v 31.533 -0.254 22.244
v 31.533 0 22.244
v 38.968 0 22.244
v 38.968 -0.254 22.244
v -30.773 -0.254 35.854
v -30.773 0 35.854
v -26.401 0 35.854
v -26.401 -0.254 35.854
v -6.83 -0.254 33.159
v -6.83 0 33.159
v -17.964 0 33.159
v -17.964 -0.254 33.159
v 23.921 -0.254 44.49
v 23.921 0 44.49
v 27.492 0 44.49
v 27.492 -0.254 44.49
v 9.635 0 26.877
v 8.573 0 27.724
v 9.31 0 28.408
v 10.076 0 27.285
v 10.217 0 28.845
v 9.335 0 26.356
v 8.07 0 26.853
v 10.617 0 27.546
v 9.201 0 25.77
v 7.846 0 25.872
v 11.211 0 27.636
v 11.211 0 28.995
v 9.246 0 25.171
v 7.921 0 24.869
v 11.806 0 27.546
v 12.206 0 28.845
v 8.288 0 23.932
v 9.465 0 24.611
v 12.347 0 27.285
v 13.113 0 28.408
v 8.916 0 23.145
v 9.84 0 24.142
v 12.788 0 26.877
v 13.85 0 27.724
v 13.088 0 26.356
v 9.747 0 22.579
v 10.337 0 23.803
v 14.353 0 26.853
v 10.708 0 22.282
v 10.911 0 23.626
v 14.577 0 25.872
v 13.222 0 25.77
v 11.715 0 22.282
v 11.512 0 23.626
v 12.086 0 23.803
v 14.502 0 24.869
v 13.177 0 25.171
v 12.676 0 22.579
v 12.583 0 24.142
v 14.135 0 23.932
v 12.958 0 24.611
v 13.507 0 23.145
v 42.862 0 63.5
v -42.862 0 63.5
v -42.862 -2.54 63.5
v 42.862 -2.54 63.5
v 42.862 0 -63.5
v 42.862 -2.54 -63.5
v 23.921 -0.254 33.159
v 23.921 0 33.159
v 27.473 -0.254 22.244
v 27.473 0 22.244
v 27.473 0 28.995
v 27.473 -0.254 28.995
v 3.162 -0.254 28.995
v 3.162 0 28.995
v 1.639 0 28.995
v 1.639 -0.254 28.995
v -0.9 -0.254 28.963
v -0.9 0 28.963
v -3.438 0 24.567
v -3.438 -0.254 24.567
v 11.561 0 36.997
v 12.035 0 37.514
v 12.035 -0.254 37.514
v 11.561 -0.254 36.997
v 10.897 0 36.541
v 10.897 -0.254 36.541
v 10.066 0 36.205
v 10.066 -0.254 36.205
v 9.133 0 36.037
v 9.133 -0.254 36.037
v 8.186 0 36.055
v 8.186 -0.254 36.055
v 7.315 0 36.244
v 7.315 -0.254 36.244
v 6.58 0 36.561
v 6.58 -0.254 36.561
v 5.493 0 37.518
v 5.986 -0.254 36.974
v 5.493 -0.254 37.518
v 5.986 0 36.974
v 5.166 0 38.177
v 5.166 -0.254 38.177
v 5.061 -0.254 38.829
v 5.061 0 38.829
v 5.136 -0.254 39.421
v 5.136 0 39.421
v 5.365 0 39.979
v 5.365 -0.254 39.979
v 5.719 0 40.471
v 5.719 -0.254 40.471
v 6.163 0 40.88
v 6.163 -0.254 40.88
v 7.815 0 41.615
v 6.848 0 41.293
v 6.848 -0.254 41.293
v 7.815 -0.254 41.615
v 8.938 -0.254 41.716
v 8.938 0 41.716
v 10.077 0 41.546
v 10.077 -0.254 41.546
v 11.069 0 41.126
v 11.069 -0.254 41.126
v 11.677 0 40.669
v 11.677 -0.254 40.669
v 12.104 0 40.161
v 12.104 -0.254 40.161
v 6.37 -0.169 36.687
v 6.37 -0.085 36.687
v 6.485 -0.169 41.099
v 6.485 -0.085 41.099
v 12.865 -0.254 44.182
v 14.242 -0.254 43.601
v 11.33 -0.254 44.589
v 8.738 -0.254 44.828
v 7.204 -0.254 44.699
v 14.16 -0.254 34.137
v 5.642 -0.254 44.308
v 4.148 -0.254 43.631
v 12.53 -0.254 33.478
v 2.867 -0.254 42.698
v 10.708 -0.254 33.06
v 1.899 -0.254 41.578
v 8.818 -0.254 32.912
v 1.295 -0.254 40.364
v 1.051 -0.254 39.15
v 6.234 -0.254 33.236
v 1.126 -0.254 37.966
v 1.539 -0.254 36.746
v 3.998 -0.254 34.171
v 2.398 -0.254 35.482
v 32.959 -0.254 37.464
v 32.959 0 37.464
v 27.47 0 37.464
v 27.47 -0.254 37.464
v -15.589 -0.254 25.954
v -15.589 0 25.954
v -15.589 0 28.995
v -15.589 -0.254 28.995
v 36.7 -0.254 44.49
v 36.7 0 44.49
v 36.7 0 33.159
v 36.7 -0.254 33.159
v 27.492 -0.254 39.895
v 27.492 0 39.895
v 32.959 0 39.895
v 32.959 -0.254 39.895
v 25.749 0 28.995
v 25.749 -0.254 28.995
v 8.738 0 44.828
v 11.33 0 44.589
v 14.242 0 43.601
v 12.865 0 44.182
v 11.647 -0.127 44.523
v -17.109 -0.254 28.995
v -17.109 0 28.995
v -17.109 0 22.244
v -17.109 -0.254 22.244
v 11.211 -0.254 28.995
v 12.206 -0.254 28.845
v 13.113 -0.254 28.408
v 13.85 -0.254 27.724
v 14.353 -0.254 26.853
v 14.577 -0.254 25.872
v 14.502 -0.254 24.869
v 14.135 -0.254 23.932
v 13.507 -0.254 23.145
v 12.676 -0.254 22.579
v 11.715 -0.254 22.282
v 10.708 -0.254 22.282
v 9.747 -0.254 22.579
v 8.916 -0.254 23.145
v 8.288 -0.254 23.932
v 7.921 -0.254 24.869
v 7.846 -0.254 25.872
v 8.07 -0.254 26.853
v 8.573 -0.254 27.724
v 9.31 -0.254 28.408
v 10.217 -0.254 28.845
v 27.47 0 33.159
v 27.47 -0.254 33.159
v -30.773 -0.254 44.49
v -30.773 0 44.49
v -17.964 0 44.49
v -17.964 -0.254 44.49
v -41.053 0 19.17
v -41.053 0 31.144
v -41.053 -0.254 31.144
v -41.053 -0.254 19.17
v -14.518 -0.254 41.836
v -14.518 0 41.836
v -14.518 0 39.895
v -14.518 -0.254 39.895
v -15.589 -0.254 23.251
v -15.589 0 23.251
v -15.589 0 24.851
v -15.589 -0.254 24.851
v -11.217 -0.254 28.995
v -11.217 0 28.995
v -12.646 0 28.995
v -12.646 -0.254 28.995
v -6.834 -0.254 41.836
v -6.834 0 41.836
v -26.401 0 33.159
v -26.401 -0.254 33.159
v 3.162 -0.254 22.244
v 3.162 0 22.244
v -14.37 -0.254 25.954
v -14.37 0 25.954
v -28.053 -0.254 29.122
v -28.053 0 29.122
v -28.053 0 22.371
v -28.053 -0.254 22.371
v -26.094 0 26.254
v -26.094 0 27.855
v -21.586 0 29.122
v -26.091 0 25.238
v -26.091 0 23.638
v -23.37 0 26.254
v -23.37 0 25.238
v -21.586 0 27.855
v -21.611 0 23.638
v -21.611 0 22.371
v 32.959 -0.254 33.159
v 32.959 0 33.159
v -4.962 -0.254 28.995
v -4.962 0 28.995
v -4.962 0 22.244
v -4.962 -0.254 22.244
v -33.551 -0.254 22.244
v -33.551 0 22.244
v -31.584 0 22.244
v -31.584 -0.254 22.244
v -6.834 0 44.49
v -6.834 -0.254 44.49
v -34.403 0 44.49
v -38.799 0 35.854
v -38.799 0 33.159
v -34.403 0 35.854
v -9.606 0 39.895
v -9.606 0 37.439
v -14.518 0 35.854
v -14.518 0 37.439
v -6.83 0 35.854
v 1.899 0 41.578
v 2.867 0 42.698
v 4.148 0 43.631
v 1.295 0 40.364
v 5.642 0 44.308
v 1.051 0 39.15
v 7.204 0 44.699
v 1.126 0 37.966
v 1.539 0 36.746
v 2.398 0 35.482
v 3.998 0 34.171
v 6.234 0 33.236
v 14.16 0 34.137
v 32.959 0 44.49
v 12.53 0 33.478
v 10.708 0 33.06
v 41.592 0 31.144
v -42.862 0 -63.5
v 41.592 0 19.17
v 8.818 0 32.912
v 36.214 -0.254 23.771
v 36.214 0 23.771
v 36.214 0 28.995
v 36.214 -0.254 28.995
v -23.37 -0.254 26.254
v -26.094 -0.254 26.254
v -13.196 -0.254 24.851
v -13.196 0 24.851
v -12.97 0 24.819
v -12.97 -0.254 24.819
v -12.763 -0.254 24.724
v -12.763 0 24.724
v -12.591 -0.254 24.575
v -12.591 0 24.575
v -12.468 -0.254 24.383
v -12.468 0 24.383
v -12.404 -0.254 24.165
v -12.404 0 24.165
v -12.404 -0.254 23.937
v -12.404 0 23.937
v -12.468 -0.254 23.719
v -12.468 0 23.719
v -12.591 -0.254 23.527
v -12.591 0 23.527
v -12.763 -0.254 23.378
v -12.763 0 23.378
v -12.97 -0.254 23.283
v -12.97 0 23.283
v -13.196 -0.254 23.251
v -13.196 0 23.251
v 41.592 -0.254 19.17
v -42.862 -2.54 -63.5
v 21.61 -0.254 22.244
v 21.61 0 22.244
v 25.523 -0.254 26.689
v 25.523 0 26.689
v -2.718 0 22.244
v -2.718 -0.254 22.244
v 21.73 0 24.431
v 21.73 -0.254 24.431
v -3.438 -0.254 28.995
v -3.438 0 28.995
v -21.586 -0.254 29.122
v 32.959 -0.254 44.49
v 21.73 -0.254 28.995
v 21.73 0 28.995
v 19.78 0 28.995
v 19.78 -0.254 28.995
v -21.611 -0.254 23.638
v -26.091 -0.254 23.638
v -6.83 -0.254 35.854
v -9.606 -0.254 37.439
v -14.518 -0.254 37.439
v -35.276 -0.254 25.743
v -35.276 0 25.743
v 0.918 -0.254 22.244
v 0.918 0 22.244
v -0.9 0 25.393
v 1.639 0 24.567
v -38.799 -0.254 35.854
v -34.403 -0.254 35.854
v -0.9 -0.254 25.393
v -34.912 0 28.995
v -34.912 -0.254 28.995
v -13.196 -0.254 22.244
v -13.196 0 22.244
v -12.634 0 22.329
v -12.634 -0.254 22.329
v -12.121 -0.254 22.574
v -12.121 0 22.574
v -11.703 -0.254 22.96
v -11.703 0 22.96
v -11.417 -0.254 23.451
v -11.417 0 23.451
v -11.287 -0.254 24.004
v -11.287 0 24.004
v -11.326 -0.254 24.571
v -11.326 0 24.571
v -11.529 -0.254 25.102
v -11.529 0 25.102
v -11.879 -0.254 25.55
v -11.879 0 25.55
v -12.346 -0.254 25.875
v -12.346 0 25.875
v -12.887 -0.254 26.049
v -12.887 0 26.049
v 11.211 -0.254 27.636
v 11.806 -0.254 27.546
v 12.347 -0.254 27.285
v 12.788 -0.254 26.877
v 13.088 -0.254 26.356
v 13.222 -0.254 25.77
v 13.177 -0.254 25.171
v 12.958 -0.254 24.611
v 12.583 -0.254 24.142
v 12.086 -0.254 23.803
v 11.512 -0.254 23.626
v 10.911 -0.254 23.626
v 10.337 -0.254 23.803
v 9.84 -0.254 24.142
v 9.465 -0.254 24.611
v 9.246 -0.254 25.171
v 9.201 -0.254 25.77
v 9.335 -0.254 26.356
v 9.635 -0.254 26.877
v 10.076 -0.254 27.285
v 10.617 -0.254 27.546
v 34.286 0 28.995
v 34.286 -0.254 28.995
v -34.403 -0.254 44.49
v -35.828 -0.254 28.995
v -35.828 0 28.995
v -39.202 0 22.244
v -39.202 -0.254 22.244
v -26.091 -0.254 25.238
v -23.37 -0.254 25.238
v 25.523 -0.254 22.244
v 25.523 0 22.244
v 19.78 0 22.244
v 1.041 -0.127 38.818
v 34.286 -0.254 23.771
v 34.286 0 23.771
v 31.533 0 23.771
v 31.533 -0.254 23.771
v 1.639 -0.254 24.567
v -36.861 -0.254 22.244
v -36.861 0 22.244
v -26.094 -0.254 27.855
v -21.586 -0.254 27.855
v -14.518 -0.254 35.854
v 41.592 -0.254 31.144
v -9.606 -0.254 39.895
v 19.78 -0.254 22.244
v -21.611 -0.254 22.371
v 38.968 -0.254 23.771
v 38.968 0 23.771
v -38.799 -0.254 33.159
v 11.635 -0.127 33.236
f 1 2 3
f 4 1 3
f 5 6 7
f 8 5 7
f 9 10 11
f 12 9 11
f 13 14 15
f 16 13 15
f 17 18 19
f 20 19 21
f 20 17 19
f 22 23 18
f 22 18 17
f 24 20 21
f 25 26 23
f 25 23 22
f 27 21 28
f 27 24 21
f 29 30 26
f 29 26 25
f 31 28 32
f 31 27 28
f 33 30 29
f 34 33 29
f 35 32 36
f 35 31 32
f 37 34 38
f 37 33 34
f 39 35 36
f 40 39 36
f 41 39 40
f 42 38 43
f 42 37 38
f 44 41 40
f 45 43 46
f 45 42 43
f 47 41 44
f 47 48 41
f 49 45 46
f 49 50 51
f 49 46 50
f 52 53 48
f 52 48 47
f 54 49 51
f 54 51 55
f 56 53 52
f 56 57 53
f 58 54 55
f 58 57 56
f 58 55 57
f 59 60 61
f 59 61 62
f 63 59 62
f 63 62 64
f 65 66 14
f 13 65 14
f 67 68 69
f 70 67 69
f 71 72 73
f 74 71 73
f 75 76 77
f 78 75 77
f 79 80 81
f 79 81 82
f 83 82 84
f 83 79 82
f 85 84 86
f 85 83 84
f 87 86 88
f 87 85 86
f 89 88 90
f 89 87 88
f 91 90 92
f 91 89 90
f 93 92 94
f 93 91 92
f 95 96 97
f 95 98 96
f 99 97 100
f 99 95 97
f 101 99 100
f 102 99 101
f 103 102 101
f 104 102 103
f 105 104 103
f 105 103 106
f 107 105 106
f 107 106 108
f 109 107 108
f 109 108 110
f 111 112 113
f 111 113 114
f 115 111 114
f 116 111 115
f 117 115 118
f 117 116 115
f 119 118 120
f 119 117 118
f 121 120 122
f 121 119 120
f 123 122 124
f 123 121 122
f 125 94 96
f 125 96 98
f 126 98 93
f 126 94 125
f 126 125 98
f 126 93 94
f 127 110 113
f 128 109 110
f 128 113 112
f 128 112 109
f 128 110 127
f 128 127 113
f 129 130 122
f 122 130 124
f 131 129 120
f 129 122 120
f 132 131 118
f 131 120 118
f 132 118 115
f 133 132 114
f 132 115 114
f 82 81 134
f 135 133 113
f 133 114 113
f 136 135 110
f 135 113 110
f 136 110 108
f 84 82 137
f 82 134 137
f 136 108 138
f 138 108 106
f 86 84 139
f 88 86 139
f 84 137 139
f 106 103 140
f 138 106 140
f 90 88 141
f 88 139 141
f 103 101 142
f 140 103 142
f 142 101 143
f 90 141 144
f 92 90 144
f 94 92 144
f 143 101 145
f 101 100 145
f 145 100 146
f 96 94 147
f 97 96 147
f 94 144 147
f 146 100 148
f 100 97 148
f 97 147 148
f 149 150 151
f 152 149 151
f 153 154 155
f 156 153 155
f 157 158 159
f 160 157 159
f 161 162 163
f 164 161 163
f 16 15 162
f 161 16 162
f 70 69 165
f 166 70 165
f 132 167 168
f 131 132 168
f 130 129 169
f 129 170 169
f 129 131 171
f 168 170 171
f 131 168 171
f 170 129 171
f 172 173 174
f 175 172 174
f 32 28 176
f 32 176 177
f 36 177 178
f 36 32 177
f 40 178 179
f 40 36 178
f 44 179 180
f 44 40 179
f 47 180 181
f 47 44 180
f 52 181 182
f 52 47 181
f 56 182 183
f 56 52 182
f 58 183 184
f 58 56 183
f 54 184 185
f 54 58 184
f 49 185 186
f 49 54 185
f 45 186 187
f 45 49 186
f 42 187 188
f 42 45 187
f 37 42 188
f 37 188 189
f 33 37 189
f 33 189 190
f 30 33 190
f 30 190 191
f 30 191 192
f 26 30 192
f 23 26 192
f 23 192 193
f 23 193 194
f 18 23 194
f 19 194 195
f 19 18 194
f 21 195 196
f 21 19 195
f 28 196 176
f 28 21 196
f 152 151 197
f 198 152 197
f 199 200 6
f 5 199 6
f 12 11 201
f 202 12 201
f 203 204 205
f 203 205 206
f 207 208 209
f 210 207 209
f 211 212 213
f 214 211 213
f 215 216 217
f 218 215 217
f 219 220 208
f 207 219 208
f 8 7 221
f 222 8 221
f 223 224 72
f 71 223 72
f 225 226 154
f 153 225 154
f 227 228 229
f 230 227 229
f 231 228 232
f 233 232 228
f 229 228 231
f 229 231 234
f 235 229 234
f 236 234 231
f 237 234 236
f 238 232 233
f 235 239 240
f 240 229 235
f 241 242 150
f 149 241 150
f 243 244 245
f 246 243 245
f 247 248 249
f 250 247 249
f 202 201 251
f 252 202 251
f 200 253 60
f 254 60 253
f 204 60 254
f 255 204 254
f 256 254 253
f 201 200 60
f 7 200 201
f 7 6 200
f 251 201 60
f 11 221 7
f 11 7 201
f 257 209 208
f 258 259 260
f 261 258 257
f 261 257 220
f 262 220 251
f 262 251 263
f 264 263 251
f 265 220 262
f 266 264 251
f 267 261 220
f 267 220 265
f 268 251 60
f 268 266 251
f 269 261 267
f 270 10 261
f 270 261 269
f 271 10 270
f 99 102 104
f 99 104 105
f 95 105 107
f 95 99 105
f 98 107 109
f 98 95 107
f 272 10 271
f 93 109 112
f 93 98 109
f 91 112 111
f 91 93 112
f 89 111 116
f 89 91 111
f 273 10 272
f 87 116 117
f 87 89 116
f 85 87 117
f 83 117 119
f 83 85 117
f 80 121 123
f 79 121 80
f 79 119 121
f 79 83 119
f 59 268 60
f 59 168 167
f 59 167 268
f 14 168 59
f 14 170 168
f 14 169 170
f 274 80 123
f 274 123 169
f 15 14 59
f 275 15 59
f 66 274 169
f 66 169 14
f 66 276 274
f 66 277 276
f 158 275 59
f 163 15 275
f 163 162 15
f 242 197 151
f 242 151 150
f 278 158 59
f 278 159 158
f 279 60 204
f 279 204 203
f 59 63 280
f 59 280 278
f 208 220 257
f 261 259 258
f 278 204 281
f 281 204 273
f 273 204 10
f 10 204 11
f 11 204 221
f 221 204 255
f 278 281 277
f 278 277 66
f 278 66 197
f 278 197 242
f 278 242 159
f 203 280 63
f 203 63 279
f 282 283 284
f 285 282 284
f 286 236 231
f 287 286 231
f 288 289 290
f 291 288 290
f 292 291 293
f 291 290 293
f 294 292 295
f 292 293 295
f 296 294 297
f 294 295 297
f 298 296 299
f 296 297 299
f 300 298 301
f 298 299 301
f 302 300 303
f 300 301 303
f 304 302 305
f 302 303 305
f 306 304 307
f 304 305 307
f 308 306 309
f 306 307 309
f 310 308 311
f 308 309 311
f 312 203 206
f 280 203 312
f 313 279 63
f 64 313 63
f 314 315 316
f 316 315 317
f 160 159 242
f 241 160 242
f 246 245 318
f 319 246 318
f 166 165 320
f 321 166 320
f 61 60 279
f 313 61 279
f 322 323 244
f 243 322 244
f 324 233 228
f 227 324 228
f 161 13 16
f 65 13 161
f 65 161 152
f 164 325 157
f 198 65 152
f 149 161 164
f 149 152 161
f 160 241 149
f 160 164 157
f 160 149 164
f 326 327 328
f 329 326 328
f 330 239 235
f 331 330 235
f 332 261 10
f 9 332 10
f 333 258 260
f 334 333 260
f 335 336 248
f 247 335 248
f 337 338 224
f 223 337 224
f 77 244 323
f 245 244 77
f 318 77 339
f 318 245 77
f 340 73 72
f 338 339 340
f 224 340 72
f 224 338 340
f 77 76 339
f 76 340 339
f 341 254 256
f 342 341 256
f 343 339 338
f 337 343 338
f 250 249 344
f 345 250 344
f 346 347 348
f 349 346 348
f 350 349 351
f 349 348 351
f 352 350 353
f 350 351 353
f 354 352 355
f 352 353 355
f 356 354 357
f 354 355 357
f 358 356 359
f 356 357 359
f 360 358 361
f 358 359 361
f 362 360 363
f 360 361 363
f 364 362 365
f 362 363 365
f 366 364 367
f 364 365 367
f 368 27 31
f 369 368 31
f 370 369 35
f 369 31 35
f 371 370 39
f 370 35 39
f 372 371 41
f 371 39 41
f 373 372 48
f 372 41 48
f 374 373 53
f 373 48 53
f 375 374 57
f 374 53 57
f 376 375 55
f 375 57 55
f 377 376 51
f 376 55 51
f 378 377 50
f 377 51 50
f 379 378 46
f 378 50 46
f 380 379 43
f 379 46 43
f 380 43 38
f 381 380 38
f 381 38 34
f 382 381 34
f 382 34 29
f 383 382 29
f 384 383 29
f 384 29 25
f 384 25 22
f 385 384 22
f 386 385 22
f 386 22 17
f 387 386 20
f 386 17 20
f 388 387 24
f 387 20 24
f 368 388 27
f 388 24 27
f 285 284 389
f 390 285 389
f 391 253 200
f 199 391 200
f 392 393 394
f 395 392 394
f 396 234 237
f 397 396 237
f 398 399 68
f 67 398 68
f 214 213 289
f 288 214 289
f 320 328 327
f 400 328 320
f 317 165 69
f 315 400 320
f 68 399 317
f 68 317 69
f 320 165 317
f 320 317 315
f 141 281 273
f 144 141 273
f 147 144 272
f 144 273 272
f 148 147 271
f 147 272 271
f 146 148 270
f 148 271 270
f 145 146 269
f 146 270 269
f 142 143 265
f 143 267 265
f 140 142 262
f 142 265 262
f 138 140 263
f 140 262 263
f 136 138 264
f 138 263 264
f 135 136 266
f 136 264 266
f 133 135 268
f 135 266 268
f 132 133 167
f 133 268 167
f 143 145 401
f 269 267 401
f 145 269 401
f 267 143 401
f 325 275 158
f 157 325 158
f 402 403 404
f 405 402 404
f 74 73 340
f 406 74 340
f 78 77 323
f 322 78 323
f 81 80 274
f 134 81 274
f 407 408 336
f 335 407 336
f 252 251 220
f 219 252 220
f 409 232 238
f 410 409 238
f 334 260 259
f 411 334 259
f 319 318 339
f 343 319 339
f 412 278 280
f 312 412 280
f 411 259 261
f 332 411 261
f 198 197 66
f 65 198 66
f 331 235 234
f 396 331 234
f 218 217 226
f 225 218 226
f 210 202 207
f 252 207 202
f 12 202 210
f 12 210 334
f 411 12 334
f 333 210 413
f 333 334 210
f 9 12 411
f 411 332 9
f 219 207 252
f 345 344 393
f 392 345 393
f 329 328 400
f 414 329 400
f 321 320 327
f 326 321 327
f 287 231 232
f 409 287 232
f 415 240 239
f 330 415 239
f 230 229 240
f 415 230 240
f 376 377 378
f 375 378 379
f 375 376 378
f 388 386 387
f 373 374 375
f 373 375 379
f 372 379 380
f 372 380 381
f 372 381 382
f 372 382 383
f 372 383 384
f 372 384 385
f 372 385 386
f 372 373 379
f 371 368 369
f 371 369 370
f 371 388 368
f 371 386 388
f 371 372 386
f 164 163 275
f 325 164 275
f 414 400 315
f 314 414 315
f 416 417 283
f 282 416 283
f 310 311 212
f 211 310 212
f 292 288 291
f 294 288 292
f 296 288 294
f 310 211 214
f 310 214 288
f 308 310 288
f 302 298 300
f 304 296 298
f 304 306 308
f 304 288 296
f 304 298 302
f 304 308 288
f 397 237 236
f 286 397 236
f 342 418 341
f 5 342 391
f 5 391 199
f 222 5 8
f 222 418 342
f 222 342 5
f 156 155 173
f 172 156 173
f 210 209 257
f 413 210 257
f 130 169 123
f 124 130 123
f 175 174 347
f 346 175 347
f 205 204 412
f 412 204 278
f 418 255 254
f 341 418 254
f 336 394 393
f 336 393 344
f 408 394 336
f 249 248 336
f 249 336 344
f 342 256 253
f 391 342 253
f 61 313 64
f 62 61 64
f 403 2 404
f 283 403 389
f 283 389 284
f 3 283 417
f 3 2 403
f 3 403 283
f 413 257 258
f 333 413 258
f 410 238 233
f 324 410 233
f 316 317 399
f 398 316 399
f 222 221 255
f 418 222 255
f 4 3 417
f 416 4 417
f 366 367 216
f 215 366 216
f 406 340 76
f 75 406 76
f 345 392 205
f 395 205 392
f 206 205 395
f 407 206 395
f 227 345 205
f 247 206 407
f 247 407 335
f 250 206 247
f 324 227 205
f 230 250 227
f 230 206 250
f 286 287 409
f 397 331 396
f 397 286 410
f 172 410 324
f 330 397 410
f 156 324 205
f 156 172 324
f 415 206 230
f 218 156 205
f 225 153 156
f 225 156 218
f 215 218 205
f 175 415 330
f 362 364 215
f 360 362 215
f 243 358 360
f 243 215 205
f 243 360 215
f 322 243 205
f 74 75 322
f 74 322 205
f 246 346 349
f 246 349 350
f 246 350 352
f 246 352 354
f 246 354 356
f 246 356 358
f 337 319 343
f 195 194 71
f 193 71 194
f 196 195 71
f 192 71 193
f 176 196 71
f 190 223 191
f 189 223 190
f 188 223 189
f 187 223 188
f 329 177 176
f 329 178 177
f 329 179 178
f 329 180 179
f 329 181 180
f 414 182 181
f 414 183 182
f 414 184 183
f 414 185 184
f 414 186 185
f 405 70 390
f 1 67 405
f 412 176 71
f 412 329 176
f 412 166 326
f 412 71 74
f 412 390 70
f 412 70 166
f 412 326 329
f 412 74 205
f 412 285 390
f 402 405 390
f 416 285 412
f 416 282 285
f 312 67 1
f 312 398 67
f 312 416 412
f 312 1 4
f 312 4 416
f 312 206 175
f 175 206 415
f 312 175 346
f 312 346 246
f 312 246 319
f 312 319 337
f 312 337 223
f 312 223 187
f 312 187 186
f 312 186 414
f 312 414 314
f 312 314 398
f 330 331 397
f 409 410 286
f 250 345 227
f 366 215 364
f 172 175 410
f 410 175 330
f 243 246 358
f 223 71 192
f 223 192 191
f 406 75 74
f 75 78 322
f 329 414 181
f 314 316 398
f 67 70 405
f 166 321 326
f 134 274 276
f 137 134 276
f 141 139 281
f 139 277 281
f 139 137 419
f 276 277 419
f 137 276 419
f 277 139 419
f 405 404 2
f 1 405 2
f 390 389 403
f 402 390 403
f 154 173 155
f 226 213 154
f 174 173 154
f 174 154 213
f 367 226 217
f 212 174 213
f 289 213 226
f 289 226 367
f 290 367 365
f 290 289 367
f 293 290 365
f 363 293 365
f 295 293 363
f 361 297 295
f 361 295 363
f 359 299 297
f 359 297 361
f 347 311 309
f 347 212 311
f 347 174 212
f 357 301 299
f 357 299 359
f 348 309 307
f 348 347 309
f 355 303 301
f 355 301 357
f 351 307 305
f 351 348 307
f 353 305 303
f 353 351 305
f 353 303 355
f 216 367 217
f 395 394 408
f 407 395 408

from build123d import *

# Parameters (mm, degrees)
SKETCH2_W           = 85.725
SKETCH2_H           = 127
BOSS_EXTRUDE2_DEPTH = 2.54
SKETCH25_W          = 82.644974211
SKETCH25_H          = 11.973738266
SKETCH25_R          = 3.375228747
SKETCH25_R_2        = 2.016253288
CUT_EXTRUDE3_DEPTH  = 0.254


with BuildPart() as part:
    # Sketch2 → Boss-Extrude2 (new body)
    with BuildSketch(Plane(origin=(0, 0, 0), x_dir=(1, 0, 0), z_dir=(0, 1, 0))):
        Rectangle(SKETCH2_W, SKETCH2_H)
    extrude(amount=-BOSS_EXTRUDE2_DEPTH)

    # Sketch25 → Cut-Extrude3 (cut)
    # profile 1 of 7: a face of its own
    with BuildSketch(Plane(origin=(0, 0, 0), x_dir=(1, 0, 0), z_dir=(0, 1, 0))):
        Polygon((-26.401346176, -35.854393253), (-26.401346176, -33.15882687), (-38.799482128, -33.15882687), (-38.799482128, -35.854393253), (-34.402699091, -35.854393253), (-34.402699091, -44.489516695), (-30.772866408, -44.489516695), (-30.772866408, -35.854393253), align=None)
    # profile 2 of 7: a face of its own
    with BuildSketch(Plane(origin=(0, 0, 0), x_dir=(1, 0, 0), z_dir=(0, 1, 0))):
        with Locations((0.269409109, -25.156846289)):
            Rectangle(SKETCH25_W, SKETCH25_H)
        Polygon((-36.860699174, -22.244332024), (-35.276491705, -25.743290865), (-33.551494351, -22.244332024), (-31.583895256, -22.244332024), (-34.91189134, -28.994789518), (-35.827566034, -28.994789518), (-39.202300363, -22.244332024), align=None, mode=Mode.SUBTRACT)
        Polygon((-21.586075079, -29.121583639), (-28.052993946, -29.121583639), (-28.052993946, -22.371126145), (-21.61112205, -22.371126145), (-21.61112205, -23.638154892), (-26.091406212, -23.638154892), (-26.091406212, -25.238354892), (-23.369701588, -25.238354892), (-23.369701588, -26.254354892), (-26.093979632, -26.254354892), (-26.093979632, -27.854554892), (-21.586075079, -27.854554892), align=None, mode=Mode.SUBTRACT)
        with BuildLine():
            Line((-12.886623389, -26.048756675), (-11.21689897, -28.994789518))
            Line((-11.21689897, -28.994789518), (-12.646380862, -28.994789518))
            Line((-12.646380862, -28.994789518), (-14.370072898, -25.953537147))
            Line((-14.370072898, -25.953537147), (-15.588703764, -25.953537147))
            Line((-15.588703764, -25.953537147), (-15.588703764, -28.994789518))
            Line((-15.588703764, -28.994789518), (-17.109275161, -28.994789518))
            Line((-17.109275161, -28.994789518), (-17.109275161, -22.244332024))
            Line((-17.109275161, -22.244332024), (-13.19566722, -22.244332024))
            ThreePointArc((-13.19566722, -22.244332024), (-11.287189095, -24.004065684), (-12.886623389, -26.048756675))
        make_face(mode=Mode.SUBTRACT)
        Polygon((-4.961504317, -22.244332024), (-2.717782968, -22.244332024), (-0.899784822, -25.393197181), (0.918213323, -22.244332024), (3.161934673, -22.244332024), (3.161934673, -28.994789518), (1.638789862, -28.994789518), (1.638789862, -24.566513755), (-0.899784822, -28.963454088), (-3.438359507, -24.566513755), (-3.438359507, -28.994789518), (-4.961504317, -28.994789518), align=None, mode=Mode.SUBTRACT)
        with Locations(Location((11.211495581, -25.619560771, 0), (0, 0, 270))):
            Circle(SKETCH25_R, mode=Mode.SUBTRACT)
        Polygon((19.780384204, -22.244332024), (21.610158793, -22.244332024), (25.523367769, -26.689139429), (25.523367769, -22.244332024), (27.473297536, -22.244332024), (27.473297536, -28.994789518), (25.748580132, -28.994789518), (21.73031397, -24.430653204), (21.73031397, -28.994789518), (19.780384204, -28.994789518), align=None, mode=Mode.SUBTRACT)
        Polygon((34.286281548, -23.770960204), (31.532751091, -23.770960204), (31.532751091, -22.244332024), (38.967725504, -22.244332024), (38.967725504, -23.770960204), (36.214195047, -23.770960204), (36.214195047, -28.994789518), (34.286281548, -28.994789518), align=None, mode=Mode.SUBTRACT)
    # profile 3 of 7: a face of its own
    with BuildSketch(Plane(origin=(0, 0, 0), x_dir=(1, 0, 0), z_dir=(0, 1, 0))):
        Polygon((-14.518148777, -37.438819572), (-14.518148777, -35.854393253), (-6.83027872, -35.854393253), (-6.83027872, -33.15882687), (-17.964276023, -33.15882687), (-17.964276023, -44.489516695), (-6.833681126, -44.489516695), (-6.833681126, -41.83560261), (-14.518148777, -41.83560261), (-14.518148777, -39.894680368), (-9.606427186, -39.894680368), (-9.606427186, -37.438819572), align=None)
    # profile 4 of 7: a face of its own
    with BuildSketch(Plane(origin=(0, 0, 0), x_dir=(1, 0, 0), z_dir=(0, 1, 0))):
        with BuildLine():
            ThreePointArc((-13.19566722, -24.851050278), (-12.39556722, -24.050950278), (-13.19566722, -23.250850278))
            Line((-13.19566722, -23.250850278), (-15.588703764, -23.250850278))
            Line((-15.588703764, -23.250850278), (-15.588703764, -24.851050278))
            Line((-15.588703764, -24.851050278), (-13.19566722, -24.851050278))
        make_face()
    # profile 5 of 7: a face of its own
    with BuildSketch(Plane(origin=(0, 0, 0), x_dir=(1, 0, 0), z_dir=(0, 1, 0))):
        Polygon((23.921491499, -33.15882687), (23.921491499, -44.489516695), (27.49217728, -44.489516695), (27.49217728, -39.894680368), (32.958681558, -39.894680368), (32.958681558, -44.489516695), (36.700300901, -44.489516695), (36.700300901, -33.15882687), (32.958681558, -33.15882687), (32.958681558, -37.463958465), (27.469552399, -37.463958465), (27.469552399, -33.15882687), align=None)
    # profile 6 of 7: a face of its own
    with BuildSketch(Plane(origin=(0, 0, 0), x_dir=(1, 0, 0), z_dir=(0, 1, 0))):
        with BuildLine():
            add(Edge.make_bspline(
                [(12.034728003, -37.513702885), (9.837658355, -34.446600836), (6.369591885, -36.687217957), (2.901525415, -38.927835078), (6.485301367, -41.099026419), (10.069077319, -43.270217761), (12.104171052, -40.161449829)],
                knots=[3.655446415, 3.655446415, 3.655446415, 5.427524106, 5.427524106, 7.199601796, 7.199601796, 8.971679487, 8.971679487, 8.971679487], degree=2, weights=[1, 0.632485182, 1, 0.632485182, 1, 0.632485182, 1]))
            Line((12.034728003, -37.513702885), (14.159680346, -34.137428518))
            add(Edge.make_bspline(
                [(14.159680346, -34.137428518), (11.789724765, -32.931705874), (8.818474178, -32.911735742)],
                knots=[4.069421787, 4.069421787, 4.069421787, 4.71238898, 4.71238898, 4.71238898], degree=2, weights=[1, 0.948767684, 1]))
            add(Edge.make_bspline(
                [(8.818474178, -32.911735742), (1.080845291, -32.85973021), (1.04079924, -38.817971113), (1.000753188, -44.776212016), (8.738382074, -44.828217548)],
                knots=[4.71238898, 4.71238898, 4.71238898, 6.283185307, 6.283185307, 7.853981634, 7.853981634, 7.853981634], degree=2, weights=[1, 0.707106781, 1, 0.707106781, 1]))
            add(Edge.make_bspline(
                [(8.738382074, -44.828217548), (11.812086243, -44.848876282), (14.24204363, -43.600803586)],
                knots=[1.570796327, 1.570796327, 1.570796327, 2.234366112, 2.234366112, 2.234366112], degree=2, weights=[1, 0.945462455, 1]))
            Line((14.24204363, -43.600803586), (12.104171052, -40.161449829))
        make_face()
    # profile 7 of 7: a face of its own
    with BuildSketch(Plane(origin=(0, 0, 0), x_dir=(1, 0, 0), z_dir=(0, 1, 0))):
        with Locations(Location((11.211495581, -25.619560771, 0), (0, 0, 270))):
            Circle(SKETCH25_R_2)
    extrude(amount=-CUT_EXTRUDE3_DEPTH, mode=Mode.SUBTRACT)


solid = part.part
